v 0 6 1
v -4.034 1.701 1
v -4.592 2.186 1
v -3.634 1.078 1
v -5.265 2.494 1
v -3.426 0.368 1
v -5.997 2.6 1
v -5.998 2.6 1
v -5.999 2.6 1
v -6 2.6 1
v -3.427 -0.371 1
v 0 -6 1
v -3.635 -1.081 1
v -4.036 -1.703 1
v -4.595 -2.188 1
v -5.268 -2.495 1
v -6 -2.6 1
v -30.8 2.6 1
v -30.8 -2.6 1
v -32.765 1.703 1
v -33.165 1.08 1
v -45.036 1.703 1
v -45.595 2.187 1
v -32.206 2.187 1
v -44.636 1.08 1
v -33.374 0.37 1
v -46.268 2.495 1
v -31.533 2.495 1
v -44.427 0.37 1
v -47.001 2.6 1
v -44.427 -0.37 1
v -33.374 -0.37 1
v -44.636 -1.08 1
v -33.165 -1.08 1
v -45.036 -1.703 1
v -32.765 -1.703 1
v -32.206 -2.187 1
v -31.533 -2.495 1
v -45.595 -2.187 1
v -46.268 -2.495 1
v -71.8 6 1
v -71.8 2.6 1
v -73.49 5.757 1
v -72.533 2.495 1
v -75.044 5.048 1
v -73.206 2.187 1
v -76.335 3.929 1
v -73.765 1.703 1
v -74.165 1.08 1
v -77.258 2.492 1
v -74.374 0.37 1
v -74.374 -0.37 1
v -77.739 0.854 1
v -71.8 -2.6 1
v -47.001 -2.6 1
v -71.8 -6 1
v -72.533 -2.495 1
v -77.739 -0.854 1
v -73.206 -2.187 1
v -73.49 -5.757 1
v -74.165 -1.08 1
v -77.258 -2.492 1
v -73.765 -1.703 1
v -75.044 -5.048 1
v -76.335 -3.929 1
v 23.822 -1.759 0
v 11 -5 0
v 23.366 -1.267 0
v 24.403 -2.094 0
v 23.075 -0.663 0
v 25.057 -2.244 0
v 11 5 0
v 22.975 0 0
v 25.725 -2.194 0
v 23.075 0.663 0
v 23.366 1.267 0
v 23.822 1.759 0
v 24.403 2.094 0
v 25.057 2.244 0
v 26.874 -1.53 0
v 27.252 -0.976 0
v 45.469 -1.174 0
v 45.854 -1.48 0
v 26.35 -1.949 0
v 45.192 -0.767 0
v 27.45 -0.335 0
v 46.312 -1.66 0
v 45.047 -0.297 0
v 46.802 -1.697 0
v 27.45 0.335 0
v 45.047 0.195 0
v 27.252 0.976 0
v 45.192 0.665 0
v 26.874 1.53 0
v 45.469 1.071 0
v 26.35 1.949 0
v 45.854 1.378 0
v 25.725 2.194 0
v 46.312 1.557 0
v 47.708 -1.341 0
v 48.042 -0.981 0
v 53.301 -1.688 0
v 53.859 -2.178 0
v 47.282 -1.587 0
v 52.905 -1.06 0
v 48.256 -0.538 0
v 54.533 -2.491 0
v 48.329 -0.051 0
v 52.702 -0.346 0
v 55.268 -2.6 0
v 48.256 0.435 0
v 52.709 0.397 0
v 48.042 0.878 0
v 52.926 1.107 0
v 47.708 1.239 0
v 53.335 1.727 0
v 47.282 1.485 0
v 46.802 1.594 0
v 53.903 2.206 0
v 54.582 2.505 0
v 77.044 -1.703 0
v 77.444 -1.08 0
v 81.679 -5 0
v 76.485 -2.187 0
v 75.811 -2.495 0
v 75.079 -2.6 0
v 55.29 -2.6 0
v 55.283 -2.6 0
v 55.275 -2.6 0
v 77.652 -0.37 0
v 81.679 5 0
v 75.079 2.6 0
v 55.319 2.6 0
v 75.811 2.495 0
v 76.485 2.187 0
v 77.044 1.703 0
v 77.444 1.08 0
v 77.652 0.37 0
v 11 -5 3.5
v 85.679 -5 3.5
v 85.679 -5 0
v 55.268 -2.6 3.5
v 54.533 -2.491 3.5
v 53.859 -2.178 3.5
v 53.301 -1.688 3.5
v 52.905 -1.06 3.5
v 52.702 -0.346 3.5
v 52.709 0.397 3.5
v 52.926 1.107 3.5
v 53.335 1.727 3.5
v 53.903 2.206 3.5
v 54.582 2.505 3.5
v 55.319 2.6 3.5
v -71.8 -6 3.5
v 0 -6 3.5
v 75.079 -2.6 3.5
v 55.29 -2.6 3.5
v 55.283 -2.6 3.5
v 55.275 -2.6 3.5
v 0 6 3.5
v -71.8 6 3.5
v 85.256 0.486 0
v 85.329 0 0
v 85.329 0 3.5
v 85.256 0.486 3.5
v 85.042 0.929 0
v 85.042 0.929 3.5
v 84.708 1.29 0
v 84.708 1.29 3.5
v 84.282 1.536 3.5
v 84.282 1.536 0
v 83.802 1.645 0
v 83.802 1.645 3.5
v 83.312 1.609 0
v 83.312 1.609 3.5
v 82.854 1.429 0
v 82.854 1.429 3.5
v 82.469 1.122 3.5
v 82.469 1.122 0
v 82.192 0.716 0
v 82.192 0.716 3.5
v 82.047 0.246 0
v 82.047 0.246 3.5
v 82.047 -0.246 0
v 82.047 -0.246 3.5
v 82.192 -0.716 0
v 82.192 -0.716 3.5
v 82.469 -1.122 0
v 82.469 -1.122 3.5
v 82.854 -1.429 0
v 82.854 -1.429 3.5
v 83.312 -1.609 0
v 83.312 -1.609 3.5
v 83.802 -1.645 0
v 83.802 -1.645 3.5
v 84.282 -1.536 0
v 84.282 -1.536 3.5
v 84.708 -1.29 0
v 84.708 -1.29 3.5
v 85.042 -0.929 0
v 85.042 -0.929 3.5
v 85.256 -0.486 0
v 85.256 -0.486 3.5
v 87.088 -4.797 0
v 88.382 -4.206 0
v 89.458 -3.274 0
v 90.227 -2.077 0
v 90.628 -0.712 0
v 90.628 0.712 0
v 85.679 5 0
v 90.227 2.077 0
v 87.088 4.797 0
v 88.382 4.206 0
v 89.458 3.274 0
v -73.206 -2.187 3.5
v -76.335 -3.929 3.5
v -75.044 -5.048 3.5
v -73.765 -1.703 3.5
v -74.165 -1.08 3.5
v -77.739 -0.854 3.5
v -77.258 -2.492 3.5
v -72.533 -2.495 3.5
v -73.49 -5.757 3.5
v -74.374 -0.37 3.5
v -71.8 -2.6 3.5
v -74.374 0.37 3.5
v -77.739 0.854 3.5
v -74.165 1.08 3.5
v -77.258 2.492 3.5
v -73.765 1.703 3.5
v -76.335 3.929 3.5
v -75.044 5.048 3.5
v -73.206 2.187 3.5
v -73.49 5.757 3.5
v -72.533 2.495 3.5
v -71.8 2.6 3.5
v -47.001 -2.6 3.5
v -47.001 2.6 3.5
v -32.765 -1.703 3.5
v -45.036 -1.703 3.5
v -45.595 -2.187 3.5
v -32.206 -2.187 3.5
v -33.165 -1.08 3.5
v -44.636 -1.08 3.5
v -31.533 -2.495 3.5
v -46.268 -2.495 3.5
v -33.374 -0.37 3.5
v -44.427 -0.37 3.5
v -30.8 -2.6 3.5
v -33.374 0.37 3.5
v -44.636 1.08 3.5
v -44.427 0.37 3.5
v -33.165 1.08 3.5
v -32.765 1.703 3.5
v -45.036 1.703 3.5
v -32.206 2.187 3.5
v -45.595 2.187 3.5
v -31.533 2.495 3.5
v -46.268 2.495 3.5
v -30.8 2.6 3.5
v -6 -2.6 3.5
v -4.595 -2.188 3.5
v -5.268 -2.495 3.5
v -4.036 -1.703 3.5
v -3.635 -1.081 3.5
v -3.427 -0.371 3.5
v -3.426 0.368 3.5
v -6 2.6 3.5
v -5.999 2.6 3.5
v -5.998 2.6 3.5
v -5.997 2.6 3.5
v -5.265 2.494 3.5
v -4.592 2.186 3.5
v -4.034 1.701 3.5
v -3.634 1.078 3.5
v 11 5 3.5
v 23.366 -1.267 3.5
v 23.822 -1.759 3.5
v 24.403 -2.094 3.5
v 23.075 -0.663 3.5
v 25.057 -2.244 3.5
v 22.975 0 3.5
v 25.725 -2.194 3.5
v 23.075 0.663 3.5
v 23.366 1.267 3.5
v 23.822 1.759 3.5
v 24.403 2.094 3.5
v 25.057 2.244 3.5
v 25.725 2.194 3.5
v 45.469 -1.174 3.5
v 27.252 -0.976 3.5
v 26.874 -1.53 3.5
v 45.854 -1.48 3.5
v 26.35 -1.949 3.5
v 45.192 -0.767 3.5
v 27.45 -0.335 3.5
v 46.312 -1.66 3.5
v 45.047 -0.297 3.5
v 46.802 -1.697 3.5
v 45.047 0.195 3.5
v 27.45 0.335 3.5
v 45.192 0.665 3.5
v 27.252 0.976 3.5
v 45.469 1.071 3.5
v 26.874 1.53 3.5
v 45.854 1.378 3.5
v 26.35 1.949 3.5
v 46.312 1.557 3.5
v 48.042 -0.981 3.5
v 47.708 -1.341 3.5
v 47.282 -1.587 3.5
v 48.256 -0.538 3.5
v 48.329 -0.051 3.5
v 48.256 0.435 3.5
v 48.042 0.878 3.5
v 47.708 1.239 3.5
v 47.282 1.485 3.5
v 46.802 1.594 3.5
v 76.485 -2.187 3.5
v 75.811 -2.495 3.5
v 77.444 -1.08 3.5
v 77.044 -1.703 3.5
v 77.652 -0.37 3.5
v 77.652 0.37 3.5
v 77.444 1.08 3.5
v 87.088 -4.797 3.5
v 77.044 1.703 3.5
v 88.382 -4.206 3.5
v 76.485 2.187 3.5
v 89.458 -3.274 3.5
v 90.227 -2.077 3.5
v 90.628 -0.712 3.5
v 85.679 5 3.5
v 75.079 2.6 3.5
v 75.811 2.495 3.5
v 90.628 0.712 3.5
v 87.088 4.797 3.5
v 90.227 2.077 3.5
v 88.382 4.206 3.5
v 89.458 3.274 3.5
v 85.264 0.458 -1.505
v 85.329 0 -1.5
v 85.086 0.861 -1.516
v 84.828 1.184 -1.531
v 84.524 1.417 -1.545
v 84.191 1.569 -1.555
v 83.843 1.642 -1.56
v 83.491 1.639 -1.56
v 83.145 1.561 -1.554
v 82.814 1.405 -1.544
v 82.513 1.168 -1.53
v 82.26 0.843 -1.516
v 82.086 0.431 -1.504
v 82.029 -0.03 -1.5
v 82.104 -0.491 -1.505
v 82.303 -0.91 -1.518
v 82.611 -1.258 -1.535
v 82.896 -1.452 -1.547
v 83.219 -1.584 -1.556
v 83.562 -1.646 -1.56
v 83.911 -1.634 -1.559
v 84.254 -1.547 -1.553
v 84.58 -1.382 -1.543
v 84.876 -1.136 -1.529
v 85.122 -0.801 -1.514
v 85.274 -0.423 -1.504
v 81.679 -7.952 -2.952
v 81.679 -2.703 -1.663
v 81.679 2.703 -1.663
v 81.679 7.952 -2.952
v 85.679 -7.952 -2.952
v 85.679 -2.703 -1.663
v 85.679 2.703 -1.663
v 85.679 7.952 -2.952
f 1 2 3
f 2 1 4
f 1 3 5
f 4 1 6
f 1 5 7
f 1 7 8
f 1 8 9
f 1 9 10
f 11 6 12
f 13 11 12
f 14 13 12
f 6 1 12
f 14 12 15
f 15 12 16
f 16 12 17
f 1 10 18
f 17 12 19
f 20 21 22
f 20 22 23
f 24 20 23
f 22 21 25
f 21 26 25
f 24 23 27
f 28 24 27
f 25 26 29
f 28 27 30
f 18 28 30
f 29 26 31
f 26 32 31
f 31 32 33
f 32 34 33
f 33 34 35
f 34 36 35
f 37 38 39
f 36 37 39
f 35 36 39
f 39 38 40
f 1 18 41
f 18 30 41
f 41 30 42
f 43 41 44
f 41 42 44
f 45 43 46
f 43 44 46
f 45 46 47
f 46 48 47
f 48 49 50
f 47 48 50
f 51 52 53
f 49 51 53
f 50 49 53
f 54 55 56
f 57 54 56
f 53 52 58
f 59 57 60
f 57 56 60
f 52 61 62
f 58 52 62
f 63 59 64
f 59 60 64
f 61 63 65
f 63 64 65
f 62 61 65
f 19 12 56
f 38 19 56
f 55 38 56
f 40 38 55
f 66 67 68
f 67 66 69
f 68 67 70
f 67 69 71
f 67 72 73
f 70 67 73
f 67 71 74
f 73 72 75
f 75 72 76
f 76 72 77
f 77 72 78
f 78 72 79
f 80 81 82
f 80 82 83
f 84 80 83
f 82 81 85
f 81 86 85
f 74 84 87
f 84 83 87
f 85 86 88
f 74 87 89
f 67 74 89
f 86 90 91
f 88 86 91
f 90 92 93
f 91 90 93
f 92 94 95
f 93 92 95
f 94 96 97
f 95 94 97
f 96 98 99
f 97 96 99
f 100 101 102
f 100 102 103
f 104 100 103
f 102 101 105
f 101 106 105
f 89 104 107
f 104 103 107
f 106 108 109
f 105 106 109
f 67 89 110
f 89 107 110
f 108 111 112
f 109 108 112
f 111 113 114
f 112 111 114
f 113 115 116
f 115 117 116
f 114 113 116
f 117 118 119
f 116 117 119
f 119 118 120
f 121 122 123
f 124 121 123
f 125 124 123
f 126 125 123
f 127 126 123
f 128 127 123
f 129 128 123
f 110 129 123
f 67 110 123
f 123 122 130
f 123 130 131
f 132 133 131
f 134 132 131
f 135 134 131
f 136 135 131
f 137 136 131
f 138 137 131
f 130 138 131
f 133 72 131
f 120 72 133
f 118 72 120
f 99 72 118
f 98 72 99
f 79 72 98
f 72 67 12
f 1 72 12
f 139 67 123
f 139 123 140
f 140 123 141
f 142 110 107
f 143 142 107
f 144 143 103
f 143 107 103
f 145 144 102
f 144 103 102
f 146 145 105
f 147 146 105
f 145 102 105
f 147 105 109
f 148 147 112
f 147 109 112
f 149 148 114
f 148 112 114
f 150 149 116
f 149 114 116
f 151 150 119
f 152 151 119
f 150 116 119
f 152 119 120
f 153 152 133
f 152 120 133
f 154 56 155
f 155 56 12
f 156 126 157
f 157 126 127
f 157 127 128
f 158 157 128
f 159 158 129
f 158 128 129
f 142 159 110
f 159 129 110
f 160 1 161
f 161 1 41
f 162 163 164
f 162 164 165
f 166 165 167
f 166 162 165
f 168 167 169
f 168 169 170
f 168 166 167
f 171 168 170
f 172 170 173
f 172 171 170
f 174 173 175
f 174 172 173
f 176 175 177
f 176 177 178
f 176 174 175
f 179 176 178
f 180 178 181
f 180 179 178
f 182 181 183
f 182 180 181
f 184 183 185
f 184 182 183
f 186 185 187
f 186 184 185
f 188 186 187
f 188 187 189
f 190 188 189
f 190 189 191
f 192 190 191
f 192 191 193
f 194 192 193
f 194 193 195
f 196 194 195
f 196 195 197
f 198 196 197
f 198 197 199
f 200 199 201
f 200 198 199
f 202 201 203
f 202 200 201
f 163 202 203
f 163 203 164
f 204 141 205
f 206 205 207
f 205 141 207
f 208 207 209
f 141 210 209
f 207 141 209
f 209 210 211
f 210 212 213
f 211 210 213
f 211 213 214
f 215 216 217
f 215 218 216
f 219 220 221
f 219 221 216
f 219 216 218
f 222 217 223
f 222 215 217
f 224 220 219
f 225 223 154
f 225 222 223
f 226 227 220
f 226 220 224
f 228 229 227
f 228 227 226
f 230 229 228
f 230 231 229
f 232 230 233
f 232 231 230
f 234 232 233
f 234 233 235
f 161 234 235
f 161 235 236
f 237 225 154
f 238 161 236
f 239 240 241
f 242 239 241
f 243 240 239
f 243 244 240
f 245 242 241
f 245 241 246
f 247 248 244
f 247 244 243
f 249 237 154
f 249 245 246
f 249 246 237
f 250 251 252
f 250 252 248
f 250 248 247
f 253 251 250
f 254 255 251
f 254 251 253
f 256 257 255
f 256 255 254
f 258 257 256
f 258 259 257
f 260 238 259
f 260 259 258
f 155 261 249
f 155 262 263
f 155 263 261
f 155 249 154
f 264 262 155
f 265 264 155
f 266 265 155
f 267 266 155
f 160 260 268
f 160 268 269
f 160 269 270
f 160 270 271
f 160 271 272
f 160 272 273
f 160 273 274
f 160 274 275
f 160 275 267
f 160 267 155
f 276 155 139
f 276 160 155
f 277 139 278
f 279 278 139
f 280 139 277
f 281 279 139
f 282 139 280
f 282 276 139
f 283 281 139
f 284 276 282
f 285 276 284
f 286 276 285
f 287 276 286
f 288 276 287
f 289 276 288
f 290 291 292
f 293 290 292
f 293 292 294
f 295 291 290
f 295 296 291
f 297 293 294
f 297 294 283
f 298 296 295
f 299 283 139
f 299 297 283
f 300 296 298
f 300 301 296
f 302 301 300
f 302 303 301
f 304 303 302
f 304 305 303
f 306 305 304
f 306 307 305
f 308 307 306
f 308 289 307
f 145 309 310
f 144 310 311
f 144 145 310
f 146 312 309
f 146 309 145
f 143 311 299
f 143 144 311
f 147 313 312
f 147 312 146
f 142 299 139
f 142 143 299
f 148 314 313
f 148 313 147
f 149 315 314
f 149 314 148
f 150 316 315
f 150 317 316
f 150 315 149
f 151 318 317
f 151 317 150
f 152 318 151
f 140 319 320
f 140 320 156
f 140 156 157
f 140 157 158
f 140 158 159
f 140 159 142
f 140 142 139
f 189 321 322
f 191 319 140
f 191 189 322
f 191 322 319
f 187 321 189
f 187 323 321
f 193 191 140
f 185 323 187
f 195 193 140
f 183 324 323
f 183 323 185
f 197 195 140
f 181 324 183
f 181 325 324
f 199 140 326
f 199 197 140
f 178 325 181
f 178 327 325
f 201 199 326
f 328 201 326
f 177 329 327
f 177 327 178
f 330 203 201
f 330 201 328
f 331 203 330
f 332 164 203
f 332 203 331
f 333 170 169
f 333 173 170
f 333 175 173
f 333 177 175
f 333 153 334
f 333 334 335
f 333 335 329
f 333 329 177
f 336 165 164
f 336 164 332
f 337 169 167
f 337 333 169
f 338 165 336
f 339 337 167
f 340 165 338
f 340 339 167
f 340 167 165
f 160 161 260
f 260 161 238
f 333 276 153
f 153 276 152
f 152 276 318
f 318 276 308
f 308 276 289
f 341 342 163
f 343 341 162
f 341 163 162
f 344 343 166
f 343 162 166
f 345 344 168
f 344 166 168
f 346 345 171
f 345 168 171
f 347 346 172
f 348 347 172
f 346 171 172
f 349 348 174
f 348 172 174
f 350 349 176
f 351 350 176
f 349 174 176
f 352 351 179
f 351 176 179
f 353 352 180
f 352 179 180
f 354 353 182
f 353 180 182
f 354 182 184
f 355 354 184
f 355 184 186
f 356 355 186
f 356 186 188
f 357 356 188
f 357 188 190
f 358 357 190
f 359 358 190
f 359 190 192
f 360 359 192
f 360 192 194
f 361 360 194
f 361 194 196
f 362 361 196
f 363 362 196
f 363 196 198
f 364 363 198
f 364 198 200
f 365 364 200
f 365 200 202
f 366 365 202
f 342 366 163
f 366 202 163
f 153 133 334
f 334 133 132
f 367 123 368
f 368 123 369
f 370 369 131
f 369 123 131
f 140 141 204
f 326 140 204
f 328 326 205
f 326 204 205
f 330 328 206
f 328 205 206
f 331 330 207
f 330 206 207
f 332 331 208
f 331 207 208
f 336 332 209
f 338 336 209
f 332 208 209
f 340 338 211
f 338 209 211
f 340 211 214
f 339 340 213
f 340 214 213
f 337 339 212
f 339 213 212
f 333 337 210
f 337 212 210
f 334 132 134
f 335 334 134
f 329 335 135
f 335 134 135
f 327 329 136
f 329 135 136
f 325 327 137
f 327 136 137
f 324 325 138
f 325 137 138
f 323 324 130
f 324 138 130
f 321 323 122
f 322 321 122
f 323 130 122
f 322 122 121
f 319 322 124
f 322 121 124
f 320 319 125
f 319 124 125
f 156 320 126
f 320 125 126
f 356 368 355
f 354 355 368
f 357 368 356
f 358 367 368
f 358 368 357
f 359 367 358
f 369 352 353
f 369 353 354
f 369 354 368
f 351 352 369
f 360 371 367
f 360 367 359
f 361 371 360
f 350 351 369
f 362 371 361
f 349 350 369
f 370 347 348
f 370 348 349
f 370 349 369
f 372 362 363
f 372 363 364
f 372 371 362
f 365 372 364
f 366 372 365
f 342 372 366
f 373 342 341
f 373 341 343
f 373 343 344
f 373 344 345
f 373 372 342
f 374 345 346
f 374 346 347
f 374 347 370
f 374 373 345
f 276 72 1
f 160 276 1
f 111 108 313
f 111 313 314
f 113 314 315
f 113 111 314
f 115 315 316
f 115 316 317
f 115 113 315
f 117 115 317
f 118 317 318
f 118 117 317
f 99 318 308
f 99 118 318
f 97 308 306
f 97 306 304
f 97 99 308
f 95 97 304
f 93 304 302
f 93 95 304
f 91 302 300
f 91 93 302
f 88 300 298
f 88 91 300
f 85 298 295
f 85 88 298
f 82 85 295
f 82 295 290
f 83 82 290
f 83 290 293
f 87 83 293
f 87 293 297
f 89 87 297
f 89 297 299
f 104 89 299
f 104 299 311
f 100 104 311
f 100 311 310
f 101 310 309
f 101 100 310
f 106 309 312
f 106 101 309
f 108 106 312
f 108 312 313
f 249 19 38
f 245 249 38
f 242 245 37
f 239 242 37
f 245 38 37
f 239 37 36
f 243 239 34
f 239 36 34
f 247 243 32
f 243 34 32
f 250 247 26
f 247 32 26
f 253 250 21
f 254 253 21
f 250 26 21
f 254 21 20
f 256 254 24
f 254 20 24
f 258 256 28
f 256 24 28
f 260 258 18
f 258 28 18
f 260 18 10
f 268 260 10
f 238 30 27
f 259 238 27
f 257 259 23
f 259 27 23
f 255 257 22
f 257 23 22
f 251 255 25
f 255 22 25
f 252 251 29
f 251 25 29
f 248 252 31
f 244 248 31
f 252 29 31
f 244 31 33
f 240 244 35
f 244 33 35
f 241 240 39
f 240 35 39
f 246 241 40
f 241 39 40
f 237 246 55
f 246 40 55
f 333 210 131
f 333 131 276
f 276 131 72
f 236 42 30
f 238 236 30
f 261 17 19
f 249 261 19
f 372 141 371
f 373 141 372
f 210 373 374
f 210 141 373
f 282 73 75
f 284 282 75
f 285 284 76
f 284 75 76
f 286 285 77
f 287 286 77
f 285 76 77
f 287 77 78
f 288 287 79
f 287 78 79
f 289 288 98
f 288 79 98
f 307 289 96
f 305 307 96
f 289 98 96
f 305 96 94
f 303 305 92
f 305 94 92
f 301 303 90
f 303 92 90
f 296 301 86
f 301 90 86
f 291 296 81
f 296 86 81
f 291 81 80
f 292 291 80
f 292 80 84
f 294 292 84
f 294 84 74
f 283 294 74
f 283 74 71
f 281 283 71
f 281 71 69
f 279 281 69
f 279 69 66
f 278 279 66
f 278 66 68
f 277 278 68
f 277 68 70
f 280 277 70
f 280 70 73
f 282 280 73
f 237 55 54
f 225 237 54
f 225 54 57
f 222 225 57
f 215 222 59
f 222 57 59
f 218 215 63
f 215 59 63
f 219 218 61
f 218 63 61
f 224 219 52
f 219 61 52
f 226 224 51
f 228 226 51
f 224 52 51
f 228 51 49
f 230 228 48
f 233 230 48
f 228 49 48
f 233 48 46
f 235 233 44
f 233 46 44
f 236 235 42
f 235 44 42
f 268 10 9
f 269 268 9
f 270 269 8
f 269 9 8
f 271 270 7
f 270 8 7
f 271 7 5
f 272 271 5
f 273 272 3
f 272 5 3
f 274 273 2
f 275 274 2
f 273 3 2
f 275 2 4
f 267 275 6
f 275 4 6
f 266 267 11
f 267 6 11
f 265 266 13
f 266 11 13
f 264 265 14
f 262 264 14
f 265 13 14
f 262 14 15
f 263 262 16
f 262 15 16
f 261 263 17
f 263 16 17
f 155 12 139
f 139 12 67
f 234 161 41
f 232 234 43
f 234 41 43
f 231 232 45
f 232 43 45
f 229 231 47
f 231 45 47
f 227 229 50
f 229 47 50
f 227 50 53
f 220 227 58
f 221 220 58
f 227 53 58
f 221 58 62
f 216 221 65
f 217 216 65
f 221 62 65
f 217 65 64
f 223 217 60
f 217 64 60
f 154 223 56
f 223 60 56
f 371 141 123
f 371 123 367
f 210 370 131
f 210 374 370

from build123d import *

# Parameters (mm, degrees)
F0_R      = 1.65
F1_DEPTH  = 3.5
F3_DEPTH  = 6
F6_DEPTH  = 2
F9_DEPTH  = 1.75
F11_D     = 4.5
F11_DEPTH = 52.4
F11_TIP   = 1.3519363928


# Not quite as in the source:
# - a feature names something its author has since deleted; it is built from what else it names


with BuildPart() as f1:
    # F0 (on Top) → F1 (new body)
    with BuildSketch(Plane.XY):
        with BuildLine():
            Line((0, 6), (-71.8000936901, 6))
            ThreePointArc((-71.8000936901, 6), (-77.8000936901, 0), (-71.8000936901, -6))
            Line((-71.8000936901, -6), (0, -6))
            Line((0, -6), (11, -5))
            Line((11, -5), (85.6788979987, -5))
            ThreePointArc((85.6788979733, -4.9999999898), (90.6788979733, 3.56e-08), (85.6788979225, 5.0000000102))
            Line((85.6788979479, 5.0000000203), (11, 4.9999992617))
            Line((11, 4.9999992617), (0, 6))
        make_face()
        with Locations((46.6788982548, -0.0513669582)):
            Circle(F0_R, mode=Mode.SUBTRACT)
        with BuildLine():
            ThreePointArc((75.0788576977, 2.5999999997), (77.6788979986, 1.85129e-05), (75.0788947235, -2.6))
            Line((75.0788947235, -2.6), (55.290283107, -2.5999750728))
            ThreePointArc((55.290283107, -2.5999750728), (55.2788947235, -2.6), (55.2675063401, -2.5999750441))
            ThreePointArc((55.2675063401, -2.5999750441), (52.6790245248, 0.02564995), (55.3188054687, 2.5996937115))
            Line((55.3188054687, 2.5996937115), (75.0788576977, 2.5999999997))
        make_face(mode=Mode.SUBTRACT)
        with BuildLine():
            ThreePointArc((-71.8000936901, -2.6), (-74.4000936901, 0), (-71.8000936901, 2.6))
            Line((-71.8000936901, 2.6), (-47.0008072172, 2.6))
            ThreePointArc((-47.0008072172, 2.6), (-44.4008072172, 0), (-47.0008072172, -2.6))
            Line((-47.0008072172, -2.6), (-71.8000936901, -2.6))
        make_face(mode=Mode.SUBTRACT)
        with BuildLine():
            ThreePointArc((-30.8000002499, -2.6), (-33.4000002499, 0), (-30.8000002499, 2.6))
            Line((-30.8000002499, 2.6), (-6.00000025, 2.6))
            ThreePointArc((-6.00000025, 2.6), (-5.9984911006, 2.599999562), (-5.9969819517, 2.5999982481))
            ThreePointArc((-5.9969819517, 2.5999982481), (-3.400000688, -0.0015091494), (-6.00000025, -2.6))
            Line((-6.00000025, -2.6), (-30.8000002499, -2.6))
        make_face(mode=Mode.SUBTRACT)
        with Locations((83.6788979987, 0)):
            Circle(F0_R, mode=Mode.SUBTRACT)
    extrude(amount=F1_DEPTH)

    # F2 (on Front) → F3 (cut, symmetric)
    with BuildSketch(Plane.XZ):
        Polygon((-80.4351404223, 1), (-80.4351404223, 0), (11, 0), (0, 1), align=None)
    extrude(amount=F3_DEPTH, both=True, mode=Mode.SUBTRACT)

    # F5 (on face) → F6 (join, symmetric)
    with BuildSketch(Plane.YZ.offset(83.6788979987)):
        Polygon((-5.7500000356, -0.75), (5.7500000356, -0.75), (5.0000000356, 0), (-5.0000000356, 0), align=None)
        with BuildLine():
            ThreePointArc((-7.9520996302, -2.9520995947), (0, -1.5), (7.9520996302, -2.9520995946))
            Line((7.9520996302, -2.9520995946), (5.7500000356, -0.75))
            Line((5.7500000356, -0.75), (-5.7500000356, -0.75))
            Line((-5.7500000356, -0.75), (-7.9520996302, -2.9520995946))
        make_face()
    extrude(amount=F6_DEPTH, both=True)

    # F9 (cut): a face of the model
    f9_faces = [f1.faces().sort_by_distance(p)[0] for p in [
        (83.6788979987, 0, 0),
    ]]
    extrude(f9_faces, amount=-F9_DEPTH, mode=Mode.SUBTRACT)

    # F11
    with Locations(Plane.XY.offset(3.5)):
        with Locations((25.2248030156, 0)):
            Hole(F11_D / 2, depth=F11_DEPTH)
            with Locations((0, 0, -(F11_DEPTH + F11_TIP / 2))):  # 118° drill point
                Cone(0, F11_D / 2, F11_TIP, mode=Mode.SUBTRACT)


solid = f1.part
